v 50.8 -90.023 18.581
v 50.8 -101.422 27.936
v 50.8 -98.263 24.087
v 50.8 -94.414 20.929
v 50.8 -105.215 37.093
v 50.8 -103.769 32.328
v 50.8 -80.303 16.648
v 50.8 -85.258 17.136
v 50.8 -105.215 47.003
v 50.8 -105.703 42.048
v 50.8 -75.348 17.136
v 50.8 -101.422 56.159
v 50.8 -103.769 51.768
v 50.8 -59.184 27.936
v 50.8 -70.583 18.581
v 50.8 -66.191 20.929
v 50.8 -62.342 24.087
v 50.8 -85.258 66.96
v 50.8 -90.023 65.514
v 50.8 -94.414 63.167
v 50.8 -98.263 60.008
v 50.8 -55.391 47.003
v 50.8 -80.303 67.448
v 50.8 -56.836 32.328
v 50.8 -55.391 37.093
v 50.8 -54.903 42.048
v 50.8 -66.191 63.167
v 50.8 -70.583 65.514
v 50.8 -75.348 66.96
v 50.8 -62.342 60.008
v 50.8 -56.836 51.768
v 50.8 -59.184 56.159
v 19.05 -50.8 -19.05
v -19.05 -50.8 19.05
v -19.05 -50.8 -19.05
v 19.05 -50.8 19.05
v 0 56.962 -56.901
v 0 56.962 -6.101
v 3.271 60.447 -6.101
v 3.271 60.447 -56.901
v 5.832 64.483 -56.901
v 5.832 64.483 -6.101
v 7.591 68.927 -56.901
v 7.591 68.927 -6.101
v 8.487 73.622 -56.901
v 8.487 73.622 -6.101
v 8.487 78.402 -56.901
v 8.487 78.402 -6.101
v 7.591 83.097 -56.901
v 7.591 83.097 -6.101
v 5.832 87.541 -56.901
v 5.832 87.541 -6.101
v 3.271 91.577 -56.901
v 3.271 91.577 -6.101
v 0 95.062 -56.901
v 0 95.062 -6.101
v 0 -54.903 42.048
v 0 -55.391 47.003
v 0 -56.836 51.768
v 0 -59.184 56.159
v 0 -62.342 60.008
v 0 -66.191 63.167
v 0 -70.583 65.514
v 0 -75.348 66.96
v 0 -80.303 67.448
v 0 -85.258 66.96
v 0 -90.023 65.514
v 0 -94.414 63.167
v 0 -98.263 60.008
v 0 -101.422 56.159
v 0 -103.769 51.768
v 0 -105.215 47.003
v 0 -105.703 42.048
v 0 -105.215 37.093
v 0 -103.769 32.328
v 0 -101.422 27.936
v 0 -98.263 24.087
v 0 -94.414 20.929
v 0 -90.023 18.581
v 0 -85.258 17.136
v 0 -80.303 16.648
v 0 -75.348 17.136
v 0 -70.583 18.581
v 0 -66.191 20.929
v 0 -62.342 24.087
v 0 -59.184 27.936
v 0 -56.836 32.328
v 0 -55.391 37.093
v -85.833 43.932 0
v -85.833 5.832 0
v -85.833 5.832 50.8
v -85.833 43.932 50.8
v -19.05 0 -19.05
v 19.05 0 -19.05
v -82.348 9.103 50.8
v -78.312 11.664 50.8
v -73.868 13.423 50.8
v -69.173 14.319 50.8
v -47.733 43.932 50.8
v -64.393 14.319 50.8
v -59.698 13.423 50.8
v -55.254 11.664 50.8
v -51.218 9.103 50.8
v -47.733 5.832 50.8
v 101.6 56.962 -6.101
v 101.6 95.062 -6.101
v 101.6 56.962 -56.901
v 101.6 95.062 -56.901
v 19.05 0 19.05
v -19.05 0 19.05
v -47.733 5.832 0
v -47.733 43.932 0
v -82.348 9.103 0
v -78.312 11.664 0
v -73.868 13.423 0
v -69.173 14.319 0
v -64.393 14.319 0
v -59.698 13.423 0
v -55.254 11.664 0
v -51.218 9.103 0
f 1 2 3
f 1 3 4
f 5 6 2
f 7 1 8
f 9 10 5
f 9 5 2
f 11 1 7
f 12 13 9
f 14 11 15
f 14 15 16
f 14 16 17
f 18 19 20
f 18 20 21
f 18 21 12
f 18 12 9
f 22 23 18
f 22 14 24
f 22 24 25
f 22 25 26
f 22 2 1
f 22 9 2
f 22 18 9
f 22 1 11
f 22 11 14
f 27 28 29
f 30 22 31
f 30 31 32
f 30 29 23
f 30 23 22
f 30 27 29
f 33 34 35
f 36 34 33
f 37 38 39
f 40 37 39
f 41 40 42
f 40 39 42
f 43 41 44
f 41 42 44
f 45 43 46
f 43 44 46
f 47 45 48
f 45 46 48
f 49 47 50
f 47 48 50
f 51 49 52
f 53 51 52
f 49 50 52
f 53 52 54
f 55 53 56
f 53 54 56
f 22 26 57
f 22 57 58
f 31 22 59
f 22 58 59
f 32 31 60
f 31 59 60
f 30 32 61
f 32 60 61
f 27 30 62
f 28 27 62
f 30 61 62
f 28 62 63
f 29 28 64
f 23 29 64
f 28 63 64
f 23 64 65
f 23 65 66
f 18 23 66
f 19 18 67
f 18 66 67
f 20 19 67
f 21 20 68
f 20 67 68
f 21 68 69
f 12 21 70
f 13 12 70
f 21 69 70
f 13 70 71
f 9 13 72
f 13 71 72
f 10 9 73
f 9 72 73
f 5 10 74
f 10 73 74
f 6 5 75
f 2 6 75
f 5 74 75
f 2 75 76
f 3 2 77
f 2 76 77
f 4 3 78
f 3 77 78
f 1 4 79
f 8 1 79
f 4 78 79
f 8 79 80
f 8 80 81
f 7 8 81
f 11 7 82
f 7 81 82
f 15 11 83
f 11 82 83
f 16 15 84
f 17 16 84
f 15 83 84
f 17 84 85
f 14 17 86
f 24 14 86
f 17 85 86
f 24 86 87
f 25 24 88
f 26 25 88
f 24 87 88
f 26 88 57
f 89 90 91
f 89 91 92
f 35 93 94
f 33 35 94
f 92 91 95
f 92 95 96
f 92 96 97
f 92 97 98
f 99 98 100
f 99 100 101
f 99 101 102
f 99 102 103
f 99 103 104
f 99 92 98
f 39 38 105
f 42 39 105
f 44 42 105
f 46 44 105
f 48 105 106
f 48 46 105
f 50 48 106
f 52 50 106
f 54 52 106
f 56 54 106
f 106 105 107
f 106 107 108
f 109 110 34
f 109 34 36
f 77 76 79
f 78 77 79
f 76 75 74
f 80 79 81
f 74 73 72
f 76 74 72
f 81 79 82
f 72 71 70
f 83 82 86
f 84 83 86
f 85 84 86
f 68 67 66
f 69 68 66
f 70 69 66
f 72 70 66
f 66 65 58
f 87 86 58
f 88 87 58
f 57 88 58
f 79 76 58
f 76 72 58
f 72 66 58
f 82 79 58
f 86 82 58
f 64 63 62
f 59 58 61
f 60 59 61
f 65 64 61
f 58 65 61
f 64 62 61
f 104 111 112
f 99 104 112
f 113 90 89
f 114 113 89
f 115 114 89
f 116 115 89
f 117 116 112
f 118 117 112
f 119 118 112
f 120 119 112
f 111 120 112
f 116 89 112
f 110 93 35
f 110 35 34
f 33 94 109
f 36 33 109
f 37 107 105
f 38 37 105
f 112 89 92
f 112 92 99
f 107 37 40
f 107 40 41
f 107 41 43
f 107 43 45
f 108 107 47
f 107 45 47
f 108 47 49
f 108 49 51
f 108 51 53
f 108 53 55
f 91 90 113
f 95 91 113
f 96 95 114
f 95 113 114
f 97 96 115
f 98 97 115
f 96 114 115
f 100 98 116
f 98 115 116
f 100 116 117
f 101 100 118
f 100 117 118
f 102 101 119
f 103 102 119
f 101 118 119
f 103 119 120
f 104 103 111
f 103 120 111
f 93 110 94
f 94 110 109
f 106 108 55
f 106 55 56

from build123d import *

# Parameters (mm, degrees)
F0_W      = 38.1
F0_H      = 38.1
F1_DEPTH  = 50.8
F2_W      = 38.1
F2_H      = 38.1
F3_DEPTH  = 50.8
F4_R      = 25.4
F5_DEPTH  = 50.8
F7_DEPTH  = 67.448851
F8_W      = 38.1
F8_H      = 50.8
F9_DEPTH  = 101.6
F11_DEPTH = 50.801


with BuildPart() as f1:
    # F0 (on Front) → F1 (new body)
    with BuildSketch(Plane.XZ):
        Rectangle(F0_W, F0_H)
    extrude(amount=F1_DEPTH)


with BuildPart() as f3:
    # F2 (on Top) → F3 (new body)
    with BuildSketch(Plane.XY):
        with Locations((-66.782912, 24.881722)):
            Rectangle(F2_W, F2_H)
    extrude(amount=F3_DEPTH)

    # F6 (on face) → F7 (cut, through all)
    with BuildSketch(Plane(origin=(0, 0, 0), x_dir=(1, 0, 0), z_dir=(0, 0, -1))):
        with BuildLine():
            Line((-47.732912, -5.831722), (-85.832912, -5.831722))
            ThreePointArc((-85.832912, -5.831722), (-66.782912, -14.431202), (-47.732912, -5.831722))
        make_face()
    extrude(amount=-F7_DEPTH, mode=Mode.SUBTRACT)


with BuildPart() as f5:
    # F4 (on Right) → F5 (new body)
    with BuildSketch(Plane.YZ):
        with Locations((-80.302887, 42.047851)):
            Circle(F4_R)
    extrude(amount=F5_DEPTH)


with BuildPart() as f9:
    # F8 (on Right) → F9 (new body)
    with BuildSketch(Plane.YZ):
        with Locations((76.012058, -31.501092)):
            Rectangle(F8_W, F8_H)
    extrude(amount=F9_DEPTH)

    # F10 (on face) → F11 (cut, through all)
    with BuildSketch(Plane.XY.offset(-6.101092)):
        with BuildLine():
            Line((0, 95.062058), (0, 56.962058))
            ThreePointArc((0, 56.962058), (8.599479, 76.012058), (0, 95.062058))
        make_face()
    extrude(amount=-F11_DEPTH, mode=Mode.SUBTRACT)


solid = Compound([f1.part, f3.part, f5.part, f9.part])
